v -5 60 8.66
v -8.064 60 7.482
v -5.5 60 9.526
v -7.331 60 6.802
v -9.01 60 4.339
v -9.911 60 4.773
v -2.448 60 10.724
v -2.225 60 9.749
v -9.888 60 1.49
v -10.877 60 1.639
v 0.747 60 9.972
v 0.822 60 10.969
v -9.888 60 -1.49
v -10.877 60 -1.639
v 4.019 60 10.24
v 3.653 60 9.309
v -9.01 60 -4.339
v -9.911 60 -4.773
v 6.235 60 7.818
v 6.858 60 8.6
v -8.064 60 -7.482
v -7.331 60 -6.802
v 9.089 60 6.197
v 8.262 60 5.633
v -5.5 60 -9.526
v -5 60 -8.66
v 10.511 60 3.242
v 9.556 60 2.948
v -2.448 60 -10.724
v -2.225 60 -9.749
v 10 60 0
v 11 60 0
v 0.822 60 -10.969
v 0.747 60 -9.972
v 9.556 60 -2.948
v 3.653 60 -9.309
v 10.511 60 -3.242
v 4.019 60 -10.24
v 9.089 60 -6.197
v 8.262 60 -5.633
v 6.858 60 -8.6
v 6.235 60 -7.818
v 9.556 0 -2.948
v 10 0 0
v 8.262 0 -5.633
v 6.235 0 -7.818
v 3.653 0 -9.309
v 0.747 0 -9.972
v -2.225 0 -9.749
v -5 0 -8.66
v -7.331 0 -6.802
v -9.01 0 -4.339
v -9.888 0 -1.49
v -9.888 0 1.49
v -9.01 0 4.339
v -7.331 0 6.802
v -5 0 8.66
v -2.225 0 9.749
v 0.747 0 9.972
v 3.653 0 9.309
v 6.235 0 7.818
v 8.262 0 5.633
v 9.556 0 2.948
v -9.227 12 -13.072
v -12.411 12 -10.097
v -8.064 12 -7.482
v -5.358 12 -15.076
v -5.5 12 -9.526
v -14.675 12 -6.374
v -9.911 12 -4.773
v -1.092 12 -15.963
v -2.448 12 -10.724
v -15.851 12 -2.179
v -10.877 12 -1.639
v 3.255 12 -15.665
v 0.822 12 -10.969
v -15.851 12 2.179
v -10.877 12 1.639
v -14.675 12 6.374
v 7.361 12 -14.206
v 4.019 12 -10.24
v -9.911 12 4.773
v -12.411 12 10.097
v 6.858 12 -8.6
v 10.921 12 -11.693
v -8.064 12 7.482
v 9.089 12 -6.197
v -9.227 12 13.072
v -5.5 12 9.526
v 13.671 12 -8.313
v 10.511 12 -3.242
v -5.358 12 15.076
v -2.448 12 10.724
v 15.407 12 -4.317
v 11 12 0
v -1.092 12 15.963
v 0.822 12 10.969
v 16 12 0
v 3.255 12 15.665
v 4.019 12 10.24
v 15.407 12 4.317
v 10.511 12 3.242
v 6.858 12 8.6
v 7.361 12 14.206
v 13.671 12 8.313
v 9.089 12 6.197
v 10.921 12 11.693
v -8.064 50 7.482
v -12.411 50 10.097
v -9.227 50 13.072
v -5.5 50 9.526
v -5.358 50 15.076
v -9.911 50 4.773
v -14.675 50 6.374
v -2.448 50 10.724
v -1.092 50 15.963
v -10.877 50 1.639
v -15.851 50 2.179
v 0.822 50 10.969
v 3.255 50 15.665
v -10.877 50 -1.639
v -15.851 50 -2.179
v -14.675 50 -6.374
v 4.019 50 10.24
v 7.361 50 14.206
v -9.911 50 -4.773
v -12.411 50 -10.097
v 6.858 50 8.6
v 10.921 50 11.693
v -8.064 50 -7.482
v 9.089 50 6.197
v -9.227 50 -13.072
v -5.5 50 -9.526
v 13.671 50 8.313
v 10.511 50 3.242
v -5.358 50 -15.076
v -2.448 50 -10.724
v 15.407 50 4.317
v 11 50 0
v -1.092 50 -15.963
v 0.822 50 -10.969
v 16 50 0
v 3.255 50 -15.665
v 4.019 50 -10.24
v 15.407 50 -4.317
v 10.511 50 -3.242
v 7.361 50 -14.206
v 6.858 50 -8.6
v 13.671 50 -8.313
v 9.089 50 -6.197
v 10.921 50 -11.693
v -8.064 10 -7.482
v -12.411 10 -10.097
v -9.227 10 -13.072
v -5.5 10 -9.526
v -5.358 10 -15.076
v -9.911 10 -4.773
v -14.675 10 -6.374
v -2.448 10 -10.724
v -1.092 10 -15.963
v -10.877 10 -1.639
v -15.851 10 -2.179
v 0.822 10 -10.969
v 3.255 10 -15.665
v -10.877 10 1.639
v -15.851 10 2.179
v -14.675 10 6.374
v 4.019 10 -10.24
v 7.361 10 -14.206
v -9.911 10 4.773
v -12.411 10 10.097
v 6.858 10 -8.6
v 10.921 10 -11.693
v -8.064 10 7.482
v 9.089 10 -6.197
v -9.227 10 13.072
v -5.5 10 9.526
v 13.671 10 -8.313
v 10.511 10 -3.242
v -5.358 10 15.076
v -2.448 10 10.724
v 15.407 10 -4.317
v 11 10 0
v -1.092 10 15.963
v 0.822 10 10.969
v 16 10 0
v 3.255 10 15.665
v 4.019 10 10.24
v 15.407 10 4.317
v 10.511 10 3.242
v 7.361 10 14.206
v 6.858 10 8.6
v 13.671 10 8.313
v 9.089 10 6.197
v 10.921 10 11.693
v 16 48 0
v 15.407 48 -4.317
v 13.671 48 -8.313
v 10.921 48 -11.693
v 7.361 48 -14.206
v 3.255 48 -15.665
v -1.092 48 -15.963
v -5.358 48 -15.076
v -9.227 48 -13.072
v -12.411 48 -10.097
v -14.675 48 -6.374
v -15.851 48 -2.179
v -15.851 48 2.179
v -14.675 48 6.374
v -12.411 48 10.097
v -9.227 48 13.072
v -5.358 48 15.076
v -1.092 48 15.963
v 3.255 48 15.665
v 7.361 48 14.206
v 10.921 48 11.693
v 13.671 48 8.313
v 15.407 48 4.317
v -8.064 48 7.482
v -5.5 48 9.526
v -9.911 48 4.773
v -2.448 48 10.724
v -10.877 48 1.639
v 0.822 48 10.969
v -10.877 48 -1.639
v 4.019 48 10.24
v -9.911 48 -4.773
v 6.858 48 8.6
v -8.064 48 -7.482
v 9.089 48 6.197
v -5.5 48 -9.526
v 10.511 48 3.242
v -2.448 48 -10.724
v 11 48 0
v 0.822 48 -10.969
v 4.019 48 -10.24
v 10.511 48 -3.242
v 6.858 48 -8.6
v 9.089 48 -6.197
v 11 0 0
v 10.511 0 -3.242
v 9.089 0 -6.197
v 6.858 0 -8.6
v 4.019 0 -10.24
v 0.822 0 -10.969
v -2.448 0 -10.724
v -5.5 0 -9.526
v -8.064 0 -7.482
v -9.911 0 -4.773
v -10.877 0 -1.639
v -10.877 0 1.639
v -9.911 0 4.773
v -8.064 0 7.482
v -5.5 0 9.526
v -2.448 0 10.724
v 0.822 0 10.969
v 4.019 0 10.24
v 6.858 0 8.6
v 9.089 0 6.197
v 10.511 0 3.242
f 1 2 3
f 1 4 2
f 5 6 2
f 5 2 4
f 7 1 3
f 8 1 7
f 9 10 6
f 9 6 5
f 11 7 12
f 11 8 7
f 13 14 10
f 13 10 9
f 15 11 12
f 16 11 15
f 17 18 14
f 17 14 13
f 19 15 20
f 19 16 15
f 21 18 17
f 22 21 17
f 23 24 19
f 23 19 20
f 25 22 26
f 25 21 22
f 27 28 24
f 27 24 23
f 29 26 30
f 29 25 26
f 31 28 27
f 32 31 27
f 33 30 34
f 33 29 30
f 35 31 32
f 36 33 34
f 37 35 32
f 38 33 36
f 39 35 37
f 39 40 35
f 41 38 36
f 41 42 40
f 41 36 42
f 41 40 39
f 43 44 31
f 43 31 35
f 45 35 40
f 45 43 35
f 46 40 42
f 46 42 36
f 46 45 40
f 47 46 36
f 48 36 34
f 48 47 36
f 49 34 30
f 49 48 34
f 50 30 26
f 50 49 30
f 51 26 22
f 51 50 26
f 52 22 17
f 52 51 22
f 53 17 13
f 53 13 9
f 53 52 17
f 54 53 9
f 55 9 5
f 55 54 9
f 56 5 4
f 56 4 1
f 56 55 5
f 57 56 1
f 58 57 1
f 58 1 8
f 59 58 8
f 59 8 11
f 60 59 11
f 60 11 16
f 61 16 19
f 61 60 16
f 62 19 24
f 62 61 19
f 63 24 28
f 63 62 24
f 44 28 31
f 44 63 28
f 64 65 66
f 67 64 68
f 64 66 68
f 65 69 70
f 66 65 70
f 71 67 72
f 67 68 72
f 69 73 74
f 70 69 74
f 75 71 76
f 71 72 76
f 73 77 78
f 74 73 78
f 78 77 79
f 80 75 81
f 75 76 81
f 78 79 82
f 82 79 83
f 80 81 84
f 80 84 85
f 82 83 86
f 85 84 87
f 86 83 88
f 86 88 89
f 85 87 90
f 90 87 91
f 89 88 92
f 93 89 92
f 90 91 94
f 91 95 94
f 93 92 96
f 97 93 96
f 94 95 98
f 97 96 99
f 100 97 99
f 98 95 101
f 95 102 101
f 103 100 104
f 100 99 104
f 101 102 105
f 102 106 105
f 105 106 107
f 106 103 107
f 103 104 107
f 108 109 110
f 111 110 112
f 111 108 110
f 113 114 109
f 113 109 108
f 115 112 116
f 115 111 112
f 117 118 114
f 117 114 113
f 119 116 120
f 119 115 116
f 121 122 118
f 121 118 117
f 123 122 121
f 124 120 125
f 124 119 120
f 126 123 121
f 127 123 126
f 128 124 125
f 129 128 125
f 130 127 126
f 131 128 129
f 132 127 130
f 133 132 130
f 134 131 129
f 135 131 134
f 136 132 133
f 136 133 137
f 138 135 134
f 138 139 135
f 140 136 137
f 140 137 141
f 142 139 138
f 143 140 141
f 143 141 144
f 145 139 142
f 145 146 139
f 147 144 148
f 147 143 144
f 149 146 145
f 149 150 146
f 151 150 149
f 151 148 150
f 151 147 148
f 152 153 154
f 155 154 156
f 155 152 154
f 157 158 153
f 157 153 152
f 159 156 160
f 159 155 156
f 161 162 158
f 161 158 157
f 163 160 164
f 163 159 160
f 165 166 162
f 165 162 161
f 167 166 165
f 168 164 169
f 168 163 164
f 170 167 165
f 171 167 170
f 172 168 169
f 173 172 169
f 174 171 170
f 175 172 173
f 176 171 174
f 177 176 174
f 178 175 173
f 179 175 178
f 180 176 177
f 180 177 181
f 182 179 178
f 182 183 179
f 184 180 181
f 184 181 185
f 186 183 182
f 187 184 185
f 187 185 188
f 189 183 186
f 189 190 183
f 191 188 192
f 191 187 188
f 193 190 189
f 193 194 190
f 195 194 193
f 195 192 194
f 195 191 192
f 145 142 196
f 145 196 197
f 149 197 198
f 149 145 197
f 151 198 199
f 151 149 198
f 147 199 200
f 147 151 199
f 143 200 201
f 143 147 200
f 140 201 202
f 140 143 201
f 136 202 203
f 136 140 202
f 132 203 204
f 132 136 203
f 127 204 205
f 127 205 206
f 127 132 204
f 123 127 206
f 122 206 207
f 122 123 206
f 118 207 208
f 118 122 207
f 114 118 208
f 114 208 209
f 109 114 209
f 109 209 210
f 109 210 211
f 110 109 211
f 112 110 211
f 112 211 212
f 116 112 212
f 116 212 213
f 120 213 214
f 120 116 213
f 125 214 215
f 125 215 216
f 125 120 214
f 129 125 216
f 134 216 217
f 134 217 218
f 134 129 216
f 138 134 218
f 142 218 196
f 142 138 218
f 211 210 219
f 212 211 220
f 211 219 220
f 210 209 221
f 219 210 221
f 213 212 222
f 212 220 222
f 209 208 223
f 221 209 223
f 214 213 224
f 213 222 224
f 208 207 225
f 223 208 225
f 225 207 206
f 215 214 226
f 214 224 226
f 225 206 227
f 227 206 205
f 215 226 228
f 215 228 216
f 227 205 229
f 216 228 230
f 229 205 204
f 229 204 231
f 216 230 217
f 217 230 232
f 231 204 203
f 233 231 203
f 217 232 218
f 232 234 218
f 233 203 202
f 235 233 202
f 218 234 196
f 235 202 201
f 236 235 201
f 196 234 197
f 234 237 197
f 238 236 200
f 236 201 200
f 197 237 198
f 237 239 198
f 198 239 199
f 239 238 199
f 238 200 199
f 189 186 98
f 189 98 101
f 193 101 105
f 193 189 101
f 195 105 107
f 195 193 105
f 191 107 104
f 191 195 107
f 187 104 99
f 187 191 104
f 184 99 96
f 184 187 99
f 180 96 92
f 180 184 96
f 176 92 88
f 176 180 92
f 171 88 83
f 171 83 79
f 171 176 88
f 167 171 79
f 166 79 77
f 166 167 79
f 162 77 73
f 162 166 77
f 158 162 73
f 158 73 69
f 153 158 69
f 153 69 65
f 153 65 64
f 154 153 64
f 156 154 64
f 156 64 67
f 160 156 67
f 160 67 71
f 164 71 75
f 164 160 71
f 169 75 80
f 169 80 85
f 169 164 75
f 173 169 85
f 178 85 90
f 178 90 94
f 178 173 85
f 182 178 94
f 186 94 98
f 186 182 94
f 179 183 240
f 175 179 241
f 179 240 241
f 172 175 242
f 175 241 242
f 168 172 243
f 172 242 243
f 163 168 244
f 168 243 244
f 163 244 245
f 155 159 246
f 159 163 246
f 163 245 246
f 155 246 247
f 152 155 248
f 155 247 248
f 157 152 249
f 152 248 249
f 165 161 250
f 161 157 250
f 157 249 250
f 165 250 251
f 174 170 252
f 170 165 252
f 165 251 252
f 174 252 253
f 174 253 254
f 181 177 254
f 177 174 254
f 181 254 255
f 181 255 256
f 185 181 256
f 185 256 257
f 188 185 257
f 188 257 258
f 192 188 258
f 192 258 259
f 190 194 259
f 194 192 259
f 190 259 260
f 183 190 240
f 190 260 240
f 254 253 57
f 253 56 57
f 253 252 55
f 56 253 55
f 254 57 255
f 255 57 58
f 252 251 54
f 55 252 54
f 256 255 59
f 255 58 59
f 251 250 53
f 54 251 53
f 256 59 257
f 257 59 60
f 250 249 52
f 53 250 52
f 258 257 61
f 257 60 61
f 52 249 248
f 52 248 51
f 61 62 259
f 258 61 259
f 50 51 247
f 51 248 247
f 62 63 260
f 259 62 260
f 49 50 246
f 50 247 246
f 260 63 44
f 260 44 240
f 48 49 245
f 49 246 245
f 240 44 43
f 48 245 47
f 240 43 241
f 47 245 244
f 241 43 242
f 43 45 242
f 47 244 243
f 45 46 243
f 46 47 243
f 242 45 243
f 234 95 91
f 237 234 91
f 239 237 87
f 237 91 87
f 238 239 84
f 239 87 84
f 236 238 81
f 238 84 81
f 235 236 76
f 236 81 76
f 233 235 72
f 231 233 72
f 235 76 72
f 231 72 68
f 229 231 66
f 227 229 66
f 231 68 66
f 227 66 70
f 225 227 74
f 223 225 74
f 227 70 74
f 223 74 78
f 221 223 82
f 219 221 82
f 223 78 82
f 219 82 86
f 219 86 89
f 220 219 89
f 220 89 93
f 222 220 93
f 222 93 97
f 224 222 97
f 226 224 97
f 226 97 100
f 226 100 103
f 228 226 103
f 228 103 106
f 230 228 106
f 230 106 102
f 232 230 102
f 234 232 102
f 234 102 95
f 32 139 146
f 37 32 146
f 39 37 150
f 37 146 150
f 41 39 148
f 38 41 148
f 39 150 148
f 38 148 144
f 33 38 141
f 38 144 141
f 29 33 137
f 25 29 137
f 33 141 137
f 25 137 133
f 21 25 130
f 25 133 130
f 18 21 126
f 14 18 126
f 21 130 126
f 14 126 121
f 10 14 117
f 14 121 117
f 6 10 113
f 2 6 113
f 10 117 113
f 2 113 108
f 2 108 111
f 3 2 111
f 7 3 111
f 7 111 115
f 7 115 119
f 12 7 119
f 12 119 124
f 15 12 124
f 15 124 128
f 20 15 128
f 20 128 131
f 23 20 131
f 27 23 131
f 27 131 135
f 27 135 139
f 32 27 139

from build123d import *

# Parameters (mm, degrees)
SKETCH_1_R      = 11
SKETCH_1_R_2    = 10
EXTRUDE_1_DEPTH = 60
EXTRUDE_START   = -10
SKETCH_2_R      = 16
SKETCH_2_R_2    = 11
EXTRUDE_3_DEPTH = 2
SKETCH_3_R      = 16
SKETCH_3_R_2    = 11
EXTRUDE_4_DEPTH = 2


with BuildPart() as part:
    # Эскиз1 → Бобышка-Вытянуть1 (new body)
    with BuildSketch(Plane(origin=(0, 0, 0), x_dir=(1, 0, 0), z_dir=(0, 1, 0))):
        Circle(SKETCH_1_R)
        Circle(SKETCH_1_R_2, mode=Mode.SUBTRACT)
    extrude(amount=EXTRUDE_1_DEPTH)

    # Эскиз2 → Бобышка-Вытянуть3 (add)
    with BuildSketch(Plane(origin=(0, 60, 0), x_dir=(1, 0, 0), z_dir=(0, 1, 0)).offset(EXTRUDE_START)):
        Circle(SKETCH_2_R)
        Circle(SKETCH_2_R_2, mode=Mode.SUBTRACT)
    extrude(amount=-EXTRUDE_3_DEPTH)

    # Эскиз3 → Бобышка-Вытянуть4 (add)
    with BuildSketch(Plane.XZ.offset(EXTRUDE_START)):
        Circle(SKETCH_3_R)
        Circle(SKETCH_3_R_2, mode=Mode.SUBTRACT)
    extrude(amount=-EXTRUDE_4_DEPTH)


solid = part.part
